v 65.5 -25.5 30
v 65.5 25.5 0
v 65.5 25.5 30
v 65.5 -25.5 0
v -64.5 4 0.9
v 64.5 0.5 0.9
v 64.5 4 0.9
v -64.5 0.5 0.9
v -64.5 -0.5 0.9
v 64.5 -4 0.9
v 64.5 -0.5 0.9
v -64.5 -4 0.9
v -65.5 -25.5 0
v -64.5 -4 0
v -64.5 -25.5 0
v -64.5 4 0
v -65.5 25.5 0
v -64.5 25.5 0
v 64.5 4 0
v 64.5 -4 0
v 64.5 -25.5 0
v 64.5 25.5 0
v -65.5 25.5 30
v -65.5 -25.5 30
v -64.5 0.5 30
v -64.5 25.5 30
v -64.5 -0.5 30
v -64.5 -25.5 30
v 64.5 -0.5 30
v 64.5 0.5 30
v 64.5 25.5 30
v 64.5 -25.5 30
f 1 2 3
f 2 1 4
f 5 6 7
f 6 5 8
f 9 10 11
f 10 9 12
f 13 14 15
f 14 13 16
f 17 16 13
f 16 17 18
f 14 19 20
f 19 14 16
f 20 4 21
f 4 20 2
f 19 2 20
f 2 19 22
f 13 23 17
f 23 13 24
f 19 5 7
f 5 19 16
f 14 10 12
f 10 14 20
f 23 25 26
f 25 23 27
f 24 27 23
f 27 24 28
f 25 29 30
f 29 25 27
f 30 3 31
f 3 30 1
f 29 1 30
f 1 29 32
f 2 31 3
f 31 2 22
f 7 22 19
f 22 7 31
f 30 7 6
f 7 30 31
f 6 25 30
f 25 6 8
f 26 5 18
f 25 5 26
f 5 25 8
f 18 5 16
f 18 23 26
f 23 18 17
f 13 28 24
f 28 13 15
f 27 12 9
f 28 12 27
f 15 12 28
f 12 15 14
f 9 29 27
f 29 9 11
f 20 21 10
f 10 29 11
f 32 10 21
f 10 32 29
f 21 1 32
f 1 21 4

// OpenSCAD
width = 51;	// [ 30:120 ]
length = 131;	// [ 80:200 ] 
height = 30;	// [  5:60 ]
foot = 8;	// [ 0:120 ]
wall = 1;	// [ 0.3:0.1:12]
floor = 0.9;	// [ 0:0.1:12]

translate([0, 0, floor/2])
cube([length, foot, floor], center=true);		// bottom bar
linear_extrude(height)
difference()  {
	square([length, width], center=true);
	for (i=[-1, 1])
	translate([0, i*(width+wall)/2])
	square([length-2*wall, width], center=true);
}
